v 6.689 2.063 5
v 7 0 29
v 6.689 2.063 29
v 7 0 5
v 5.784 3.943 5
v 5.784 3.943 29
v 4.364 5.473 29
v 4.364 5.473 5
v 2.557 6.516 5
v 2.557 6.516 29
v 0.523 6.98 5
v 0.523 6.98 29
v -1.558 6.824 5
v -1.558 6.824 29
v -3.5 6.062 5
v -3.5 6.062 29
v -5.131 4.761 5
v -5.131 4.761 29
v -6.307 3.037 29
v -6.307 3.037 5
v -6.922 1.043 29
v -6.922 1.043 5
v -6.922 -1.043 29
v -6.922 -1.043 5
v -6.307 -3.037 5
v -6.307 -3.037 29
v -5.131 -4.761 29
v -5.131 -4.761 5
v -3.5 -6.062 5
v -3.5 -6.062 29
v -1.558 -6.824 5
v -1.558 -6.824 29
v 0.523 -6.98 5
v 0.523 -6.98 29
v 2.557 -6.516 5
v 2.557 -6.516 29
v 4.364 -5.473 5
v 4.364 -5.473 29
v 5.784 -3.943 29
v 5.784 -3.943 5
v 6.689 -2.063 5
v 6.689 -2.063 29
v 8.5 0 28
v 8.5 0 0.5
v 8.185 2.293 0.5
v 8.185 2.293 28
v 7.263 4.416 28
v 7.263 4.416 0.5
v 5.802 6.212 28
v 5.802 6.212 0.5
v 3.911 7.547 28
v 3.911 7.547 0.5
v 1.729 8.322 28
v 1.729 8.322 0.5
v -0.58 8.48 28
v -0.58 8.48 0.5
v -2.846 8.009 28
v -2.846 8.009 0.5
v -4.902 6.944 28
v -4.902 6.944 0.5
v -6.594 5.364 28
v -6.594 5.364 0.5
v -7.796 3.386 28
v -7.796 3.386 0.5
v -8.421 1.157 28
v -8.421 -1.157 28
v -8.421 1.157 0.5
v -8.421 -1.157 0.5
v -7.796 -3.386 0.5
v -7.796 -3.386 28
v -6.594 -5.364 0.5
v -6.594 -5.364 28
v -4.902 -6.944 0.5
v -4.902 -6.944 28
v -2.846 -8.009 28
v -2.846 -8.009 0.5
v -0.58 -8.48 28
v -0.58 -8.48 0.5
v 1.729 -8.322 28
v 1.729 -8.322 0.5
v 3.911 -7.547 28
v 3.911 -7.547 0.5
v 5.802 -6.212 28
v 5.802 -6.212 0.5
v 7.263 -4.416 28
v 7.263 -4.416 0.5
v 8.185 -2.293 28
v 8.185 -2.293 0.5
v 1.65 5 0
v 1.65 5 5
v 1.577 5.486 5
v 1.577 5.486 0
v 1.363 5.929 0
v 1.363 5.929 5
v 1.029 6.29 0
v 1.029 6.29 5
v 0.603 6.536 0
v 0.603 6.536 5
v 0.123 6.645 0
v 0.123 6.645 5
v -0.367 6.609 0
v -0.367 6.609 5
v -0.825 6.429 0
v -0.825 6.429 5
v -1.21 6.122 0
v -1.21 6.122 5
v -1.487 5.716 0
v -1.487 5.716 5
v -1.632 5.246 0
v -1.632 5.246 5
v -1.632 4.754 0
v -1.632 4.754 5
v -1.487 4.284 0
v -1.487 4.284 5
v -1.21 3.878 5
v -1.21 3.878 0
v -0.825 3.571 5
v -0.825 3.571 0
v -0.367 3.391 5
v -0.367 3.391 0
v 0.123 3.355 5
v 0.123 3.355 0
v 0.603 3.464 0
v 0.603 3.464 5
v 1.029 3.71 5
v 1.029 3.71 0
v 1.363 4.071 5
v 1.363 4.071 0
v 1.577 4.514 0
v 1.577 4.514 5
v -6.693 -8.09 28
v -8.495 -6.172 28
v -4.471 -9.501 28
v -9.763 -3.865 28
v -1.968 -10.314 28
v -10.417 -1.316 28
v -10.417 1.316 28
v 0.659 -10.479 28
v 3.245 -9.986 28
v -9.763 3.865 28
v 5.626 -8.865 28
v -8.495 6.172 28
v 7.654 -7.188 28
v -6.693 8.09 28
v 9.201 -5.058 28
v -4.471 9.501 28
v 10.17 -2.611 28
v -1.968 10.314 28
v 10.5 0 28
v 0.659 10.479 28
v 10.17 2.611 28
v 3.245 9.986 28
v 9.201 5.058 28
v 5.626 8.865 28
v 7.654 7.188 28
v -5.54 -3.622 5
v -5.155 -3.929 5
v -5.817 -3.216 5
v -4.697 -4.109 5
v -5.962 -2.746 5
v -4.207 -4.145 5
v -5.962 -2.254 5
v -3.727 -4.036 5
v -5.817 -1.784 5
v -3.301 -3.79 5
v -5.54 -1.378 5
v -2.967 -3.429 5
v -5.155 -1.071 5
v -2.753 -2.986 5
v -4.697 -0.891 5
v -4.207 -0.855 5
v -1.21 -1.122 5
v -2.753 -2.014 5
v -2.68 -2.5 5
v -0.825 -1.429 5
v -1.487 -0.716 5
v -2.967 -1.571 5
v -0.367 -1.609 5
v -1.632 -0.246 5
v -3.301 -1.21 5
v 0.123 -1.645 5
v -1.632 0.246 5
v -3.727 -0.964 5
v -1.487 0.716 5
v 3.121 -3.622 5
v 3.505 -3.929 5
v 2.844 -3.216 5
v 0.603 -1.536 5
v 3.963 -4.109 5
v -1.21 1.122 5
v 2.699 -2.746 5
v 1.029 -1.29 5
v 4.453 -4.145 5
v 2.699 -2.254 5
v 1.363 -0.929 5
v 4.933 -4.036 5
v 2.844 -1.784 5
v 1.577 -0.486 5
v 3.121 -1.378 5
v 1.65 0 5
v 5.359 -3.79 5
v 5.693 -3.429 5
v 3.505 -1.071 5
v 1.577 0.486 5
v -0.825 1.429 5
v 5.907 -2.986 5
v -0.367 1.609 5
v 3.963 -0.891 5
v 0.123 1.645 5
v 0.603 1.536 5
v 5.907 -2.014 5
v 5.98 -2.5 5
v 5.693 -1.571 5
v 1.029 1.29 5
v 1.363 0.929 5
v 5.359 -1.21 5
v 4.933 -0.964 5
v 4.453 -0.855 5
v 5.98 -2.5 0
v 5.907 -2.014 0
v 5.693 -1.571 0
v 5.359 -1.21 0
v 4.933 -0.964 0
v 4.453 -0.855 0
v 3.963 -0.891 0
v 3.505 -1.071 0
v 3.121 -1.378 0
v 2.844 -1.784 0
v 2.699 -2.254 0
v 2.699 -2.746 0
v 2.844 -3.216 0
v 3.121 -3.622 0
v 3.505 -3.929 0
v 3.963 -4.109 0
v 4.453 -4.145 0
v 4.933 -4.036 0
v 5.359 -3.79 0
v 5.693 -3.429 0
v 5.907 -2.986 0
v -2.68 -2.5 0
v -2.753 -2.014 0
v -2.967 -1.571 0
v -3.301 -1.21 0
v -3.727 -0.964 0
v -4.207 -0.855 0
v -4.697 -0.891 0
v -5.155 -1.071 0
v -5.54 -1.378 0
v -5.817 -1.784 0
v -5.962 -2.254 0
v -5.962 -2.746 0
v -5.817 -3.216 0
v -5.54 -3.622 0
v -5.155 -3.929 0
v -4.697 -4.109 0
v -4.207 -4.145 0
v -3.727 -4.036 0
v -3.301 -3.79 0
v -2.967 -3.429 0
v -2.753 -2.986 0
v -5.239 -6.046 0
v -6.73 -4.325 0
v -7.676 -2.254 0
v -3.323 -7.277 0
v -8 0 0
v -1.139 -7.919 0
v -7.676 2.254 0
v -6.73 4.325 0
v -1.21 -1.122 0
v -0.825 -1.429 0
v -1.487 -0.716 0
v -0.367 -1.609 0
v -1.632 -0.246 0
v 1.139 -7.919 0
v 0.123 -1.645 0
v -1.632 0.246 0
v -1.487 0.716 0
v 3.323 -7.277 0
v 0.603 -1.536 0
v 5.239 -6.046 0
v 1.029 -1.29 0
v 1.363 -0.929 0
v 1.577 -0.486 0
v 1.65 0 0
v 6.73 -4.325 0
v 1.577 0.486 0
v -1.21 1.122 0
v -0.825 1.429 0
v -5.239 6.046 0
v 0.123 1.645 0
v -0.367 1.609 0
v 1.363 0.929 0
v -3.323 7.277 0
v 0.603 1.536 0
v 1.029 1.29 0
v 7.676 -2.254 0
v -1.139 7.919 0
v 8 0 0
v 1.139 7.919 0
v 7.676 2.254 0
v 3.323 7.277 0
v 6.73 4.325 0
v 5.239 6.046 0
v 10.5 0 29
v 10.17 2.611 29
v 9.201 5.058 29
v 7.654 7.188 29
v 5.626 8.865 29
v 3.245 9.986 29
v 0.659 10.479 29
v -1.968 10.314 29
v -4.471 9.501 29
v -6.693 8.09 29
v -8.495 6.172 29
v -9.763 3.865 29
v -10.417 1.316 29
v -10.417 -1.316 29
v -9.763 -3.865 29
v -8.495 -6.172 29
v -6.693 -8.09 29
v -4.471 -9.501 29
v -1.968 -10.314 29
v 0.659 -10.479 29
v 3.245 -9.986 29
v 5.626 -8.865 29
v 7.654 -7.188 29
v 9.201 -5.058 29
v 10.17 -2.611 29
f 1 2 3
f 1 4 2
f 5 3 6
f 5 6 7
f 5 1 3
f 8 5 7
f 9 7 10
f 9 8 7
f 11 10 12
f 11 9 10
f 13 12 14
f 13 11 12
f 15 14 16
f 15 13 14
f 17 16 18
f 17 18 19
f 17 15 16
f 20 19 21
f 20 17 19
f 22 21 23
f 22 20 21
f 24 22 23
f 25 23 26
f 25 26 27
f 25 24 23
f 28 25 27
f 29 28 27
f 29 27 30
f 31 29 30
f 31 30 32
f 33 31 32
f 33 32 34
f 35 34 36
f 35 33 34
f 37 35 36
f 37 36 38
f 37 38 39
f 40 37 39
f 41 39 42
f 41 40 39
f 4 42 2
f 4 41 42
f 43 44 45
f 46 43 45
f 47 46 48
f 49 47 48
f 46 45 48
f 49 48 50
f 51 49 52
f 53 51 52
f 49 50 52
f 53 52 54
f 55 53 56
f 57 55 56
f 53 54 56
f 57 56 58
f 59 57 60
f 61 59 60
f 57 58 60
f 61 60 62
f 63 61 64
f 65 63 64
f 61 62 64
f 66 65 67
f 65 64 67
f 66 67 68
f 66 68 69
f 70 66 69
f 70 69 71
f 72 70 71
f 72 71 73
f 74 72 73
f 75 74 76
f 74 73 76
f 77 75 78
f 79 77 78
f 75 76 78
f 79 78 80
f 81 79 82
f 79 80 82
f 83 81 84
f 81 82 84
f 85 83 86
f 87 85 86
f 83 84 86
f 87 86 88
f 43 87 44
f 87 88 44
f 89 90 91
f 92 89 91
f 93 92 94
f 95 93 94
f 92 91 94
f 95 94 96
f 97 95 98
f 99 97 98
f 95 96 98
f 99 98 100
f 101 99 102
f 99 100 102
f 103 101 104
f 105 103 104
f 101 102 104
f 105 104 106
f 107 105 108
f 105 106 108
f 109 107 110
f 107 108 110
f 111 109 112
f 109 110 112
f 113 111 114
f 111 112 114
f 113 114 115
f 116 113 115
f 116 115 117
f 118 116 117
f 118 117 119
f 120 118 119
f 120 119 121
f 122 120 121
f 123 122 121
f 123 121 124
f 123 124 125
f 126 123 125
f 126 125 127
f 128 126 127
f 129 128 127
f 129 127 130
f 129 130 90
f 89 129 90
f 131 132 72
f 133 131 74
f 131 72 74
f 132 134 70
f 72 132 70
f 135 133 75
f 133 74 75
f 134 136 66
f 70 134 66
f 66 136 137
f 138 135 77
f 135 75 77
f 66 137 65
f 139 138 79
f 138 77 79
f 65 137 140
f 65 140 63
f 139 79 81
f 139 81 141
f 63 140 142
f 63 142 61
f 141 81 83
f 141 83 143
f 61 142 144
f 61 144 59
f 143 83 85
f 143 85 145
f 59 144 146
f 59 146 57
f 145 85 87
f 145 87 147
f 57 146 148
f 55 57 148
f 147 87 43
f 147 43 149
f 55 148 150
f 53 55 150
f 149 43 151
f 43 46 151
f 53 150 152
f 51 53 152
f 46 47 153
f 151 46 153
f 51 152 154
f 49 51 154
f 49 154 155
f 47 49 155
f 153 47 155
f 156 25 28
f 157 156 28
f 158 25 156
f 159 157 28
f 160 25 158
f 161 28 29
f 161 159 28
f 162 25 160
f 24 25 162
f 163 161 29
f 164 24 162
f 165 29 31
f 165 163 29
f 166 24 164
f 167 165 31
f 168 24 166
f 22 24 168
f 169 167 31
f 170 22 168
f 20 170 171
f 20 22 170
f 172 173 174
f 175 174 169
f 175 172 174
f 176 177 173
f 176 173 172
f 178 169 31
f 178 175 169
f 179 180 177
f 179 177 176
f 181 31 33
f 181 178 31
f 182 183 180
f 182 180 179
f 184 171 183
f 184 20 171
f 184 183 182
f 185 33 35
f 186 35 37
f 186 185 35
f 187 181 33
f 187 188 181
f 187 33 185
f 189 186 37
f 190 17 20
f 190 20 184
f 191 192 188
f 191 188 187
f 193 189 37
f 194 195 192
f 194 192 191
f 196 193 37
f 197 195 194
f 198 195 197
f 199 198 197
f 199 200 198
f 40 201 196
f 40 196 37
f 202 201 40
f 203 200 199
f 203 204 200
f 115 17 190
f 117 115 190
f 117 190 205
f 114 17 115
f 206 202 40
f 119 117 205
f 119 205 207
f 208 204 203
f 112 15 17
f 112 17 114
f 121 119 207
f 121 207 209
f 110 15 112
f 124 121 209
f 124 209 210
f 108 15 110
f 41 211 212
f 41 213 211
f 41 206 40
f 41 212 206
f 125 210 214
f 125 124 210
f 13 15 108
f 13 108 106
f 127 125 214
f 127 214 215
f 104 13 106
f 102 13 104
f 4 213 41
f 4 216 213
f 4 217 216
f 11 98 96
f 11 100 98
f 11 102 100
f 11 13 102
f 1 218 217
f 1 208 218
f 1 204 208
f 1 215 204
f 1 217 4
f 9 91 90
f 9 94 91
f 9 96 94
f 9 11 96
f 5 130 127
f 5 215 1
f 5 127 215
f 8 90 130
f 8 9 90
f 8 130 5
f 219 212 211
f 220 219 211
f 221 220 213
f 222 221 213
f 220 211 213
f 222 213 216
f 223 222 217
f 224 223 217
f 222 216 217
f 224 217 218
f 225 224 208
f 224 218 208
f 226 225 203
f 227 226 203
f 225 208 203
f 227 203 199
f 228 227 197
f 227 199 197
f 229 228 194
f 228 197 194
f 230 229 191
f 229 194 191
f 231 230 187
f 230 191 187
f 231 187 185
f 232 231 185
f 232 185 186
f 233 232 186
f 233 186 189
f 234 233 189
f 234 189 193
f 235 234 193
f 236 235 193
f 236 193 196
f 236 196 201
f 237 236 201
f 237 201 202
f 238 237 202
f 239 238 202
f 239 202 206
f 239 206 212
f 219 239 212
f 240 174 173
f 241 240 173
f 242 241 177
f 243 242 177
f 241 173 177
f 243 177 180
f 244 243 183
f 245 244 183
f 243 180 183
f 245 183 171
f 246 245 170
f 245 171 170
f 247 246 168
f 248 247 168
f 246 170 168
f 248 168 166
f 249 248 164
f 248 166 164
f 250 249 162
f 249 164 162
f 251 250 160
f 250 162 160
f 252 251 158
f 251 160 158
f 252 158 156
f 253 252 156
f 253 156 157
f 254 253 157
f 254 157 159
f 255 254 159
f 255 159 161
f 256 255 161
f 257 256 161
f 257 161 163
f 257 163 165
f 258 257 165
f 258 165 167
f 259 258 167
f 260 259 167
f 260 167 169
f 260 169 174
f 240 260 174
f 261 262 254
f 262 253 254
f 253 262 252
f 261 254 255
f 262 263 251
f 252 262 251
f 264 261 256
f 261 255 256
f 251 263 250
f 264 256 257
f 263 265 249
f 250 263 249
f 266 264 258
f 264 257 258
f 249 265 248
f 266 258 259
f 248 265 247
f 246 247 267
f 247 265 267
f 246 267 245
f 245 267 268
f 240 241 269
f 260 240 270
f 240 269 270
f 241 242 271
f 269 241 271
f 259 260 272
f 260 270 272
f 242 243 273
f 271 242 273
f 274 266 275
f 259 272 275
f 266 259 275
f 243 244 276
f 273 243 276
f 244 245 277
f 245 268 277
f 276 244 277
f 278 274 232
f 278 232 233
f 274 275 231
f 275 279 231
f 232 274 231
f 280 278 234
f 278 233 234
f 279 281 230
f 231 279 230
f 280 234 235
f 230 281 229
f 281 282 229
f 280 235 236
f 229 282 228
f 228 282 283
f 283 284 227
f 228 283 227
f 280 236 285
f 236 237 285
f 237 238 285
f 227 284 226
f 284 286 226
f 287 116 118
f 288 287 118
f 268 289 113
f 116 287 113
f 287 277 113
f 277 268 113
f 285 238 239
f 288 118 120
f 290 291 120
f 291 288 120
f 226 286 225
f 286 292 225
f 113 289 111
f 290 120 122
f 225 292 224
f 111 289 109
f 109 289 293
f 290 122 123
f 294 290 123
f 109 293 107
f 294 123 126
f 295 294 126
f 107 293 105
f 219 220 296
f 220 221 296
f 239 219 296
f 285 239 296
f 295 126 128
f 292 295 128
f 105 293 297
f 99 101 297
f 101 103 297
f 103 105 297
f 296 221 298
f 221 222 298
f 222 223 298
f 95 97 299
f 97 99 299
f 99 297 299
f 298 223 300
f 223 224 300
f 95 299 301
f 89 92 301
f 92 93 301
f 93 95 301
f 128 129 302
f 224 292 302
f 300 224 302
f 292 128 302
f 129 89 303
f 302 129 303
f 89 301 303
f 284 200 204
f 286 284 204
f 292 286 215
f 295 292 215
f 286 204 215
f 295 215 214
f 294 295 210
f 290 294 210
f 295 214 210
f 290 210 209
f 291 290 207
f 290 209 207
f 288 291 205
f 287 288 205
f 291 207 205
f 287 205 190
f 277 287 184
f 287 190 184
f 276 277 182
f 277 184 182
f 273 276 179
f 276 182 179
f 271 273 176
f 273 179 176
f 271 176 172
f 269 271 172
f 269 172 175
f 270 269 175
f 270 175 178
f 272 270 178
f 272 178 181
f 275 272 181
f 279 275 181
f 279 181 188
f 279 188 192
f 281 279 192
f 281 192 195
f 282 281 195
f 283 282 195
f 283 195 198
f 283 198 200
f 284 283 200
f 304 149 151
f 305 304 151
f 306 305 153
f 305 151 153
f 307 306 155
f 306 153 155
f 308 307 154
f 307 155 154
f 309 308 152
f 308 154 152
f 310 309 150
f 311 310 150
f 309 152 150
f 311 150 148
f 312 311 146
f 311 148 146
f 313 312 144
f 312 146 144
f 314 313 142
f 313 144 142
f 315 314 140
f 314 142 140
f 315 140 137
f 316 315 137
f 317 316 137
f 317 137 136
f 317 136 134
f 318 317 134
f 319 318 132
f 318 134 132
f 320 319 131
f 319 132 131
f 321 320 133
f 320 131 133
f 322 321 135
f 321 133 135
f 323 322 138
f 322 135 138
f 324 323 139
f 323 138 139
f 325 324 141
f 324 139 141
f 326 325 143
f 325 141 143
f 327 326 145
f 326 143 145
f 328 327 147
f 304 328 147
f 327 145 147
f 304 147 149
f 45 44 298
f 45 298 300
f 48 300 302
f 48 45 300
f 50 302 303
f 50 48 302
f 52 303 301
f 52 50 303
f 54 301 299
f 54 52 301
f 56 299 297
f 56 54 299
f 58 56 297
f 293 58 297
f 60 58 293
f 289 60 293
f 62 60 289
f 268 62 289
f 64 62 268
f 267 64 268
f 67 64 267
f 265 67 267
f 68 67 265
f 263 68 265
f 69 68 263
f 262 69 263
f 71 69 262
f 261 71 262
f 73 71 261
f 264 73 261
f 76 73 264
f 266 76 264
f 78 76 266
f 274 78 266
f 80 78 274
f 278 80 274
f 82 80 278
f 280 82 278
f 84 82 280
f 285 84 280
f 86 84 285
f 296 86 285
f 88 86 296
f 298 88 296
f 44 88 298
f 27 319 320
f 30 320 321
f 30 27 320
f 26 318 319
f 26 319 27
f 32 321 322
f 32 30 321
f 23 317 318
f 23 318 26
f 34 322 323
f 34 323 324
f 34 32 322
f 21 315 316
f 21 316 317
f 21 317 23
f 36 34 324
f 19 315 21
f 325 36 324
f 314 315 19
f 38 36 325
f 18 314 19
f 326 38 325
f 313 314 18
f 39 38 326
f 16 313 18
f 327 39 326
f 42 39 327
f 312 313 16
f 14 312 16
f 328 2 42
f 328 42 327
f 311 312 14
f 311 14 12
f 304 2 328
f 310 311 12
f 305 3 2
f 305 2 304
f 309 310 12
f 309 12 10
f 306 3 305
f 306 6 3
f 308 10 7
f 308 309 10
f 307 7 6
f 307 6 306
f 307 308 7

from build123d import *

# Parameters (mm, degrees)
SKETCH_1_R          = 8.5
EXTRUDE_1_DEPTH     = 28
SKETCH_2_R          = 7
CUT_EXTRUDE_3_DEPTH = 23
HOLE_WIZARD_M4_1_D  = 3.3
SKETCH_10_R         = 10.5
SKETCH_10_R_2       = 8.5
SKETCH_10_R_3       = 7
EXTRUDE_4_DEPTH     = 1
CHAMFER_1_SIZE      = 0.5


with BuildPart() as part:
    # 草图1 → 凸台-拉伸1 (new body)
    with BuildSketch(Plane.XY):
        Circle(SKETCH_1_R)
    extrude(amount=EXTRUDE_1_DEPTH)

    # 草图2 → 切除-拉伸3 (cut)
    with BuildSketch(Plane.XY.offset(28)):
        Circle(SKETCH_2_R)
    extrude(amount=-CUT_EXTRUDE_3_DEPTH, mode=Mode.SUBTRACT)

    # M4 螺纹孔1 (through all)
    with Locations(Plane(origin=(0, 0, 0), x_dir=(-1, 0, 0), z_dir=(0, 0, -1))):
        with Locations((0, 5), (0, 0), (-4.330127019, -2.5), (4.330127019, -2.5)):
            Hole(HOLE_WIZARD_M4_1_D / 2)

    # 草图10 → 凸台-拉伸4 (add)
    with BuildSketch(Plane.XY.offset(28)):
        Circle(SKETCH_10_R)
        Circle(SKETCH_10_R_2, mode=Mode.SUBTRACT)
        Circle(SKETCH_10_R_2)
        Circle(SKETCH_10_R_3, mode=Mode.SUBTRACT)
    extrude(amount=EXTRUDE_4_DEPTH)

    # 倒角1
    chamfer_1_edges = [part.edges().sort_by_distance(p)[0] for p in [
        (-8.5, 0, 0),
    ]]
    chamfer(chamfer_1_edges, length=CHAMFER_1_SIZE)


solid = part.part
